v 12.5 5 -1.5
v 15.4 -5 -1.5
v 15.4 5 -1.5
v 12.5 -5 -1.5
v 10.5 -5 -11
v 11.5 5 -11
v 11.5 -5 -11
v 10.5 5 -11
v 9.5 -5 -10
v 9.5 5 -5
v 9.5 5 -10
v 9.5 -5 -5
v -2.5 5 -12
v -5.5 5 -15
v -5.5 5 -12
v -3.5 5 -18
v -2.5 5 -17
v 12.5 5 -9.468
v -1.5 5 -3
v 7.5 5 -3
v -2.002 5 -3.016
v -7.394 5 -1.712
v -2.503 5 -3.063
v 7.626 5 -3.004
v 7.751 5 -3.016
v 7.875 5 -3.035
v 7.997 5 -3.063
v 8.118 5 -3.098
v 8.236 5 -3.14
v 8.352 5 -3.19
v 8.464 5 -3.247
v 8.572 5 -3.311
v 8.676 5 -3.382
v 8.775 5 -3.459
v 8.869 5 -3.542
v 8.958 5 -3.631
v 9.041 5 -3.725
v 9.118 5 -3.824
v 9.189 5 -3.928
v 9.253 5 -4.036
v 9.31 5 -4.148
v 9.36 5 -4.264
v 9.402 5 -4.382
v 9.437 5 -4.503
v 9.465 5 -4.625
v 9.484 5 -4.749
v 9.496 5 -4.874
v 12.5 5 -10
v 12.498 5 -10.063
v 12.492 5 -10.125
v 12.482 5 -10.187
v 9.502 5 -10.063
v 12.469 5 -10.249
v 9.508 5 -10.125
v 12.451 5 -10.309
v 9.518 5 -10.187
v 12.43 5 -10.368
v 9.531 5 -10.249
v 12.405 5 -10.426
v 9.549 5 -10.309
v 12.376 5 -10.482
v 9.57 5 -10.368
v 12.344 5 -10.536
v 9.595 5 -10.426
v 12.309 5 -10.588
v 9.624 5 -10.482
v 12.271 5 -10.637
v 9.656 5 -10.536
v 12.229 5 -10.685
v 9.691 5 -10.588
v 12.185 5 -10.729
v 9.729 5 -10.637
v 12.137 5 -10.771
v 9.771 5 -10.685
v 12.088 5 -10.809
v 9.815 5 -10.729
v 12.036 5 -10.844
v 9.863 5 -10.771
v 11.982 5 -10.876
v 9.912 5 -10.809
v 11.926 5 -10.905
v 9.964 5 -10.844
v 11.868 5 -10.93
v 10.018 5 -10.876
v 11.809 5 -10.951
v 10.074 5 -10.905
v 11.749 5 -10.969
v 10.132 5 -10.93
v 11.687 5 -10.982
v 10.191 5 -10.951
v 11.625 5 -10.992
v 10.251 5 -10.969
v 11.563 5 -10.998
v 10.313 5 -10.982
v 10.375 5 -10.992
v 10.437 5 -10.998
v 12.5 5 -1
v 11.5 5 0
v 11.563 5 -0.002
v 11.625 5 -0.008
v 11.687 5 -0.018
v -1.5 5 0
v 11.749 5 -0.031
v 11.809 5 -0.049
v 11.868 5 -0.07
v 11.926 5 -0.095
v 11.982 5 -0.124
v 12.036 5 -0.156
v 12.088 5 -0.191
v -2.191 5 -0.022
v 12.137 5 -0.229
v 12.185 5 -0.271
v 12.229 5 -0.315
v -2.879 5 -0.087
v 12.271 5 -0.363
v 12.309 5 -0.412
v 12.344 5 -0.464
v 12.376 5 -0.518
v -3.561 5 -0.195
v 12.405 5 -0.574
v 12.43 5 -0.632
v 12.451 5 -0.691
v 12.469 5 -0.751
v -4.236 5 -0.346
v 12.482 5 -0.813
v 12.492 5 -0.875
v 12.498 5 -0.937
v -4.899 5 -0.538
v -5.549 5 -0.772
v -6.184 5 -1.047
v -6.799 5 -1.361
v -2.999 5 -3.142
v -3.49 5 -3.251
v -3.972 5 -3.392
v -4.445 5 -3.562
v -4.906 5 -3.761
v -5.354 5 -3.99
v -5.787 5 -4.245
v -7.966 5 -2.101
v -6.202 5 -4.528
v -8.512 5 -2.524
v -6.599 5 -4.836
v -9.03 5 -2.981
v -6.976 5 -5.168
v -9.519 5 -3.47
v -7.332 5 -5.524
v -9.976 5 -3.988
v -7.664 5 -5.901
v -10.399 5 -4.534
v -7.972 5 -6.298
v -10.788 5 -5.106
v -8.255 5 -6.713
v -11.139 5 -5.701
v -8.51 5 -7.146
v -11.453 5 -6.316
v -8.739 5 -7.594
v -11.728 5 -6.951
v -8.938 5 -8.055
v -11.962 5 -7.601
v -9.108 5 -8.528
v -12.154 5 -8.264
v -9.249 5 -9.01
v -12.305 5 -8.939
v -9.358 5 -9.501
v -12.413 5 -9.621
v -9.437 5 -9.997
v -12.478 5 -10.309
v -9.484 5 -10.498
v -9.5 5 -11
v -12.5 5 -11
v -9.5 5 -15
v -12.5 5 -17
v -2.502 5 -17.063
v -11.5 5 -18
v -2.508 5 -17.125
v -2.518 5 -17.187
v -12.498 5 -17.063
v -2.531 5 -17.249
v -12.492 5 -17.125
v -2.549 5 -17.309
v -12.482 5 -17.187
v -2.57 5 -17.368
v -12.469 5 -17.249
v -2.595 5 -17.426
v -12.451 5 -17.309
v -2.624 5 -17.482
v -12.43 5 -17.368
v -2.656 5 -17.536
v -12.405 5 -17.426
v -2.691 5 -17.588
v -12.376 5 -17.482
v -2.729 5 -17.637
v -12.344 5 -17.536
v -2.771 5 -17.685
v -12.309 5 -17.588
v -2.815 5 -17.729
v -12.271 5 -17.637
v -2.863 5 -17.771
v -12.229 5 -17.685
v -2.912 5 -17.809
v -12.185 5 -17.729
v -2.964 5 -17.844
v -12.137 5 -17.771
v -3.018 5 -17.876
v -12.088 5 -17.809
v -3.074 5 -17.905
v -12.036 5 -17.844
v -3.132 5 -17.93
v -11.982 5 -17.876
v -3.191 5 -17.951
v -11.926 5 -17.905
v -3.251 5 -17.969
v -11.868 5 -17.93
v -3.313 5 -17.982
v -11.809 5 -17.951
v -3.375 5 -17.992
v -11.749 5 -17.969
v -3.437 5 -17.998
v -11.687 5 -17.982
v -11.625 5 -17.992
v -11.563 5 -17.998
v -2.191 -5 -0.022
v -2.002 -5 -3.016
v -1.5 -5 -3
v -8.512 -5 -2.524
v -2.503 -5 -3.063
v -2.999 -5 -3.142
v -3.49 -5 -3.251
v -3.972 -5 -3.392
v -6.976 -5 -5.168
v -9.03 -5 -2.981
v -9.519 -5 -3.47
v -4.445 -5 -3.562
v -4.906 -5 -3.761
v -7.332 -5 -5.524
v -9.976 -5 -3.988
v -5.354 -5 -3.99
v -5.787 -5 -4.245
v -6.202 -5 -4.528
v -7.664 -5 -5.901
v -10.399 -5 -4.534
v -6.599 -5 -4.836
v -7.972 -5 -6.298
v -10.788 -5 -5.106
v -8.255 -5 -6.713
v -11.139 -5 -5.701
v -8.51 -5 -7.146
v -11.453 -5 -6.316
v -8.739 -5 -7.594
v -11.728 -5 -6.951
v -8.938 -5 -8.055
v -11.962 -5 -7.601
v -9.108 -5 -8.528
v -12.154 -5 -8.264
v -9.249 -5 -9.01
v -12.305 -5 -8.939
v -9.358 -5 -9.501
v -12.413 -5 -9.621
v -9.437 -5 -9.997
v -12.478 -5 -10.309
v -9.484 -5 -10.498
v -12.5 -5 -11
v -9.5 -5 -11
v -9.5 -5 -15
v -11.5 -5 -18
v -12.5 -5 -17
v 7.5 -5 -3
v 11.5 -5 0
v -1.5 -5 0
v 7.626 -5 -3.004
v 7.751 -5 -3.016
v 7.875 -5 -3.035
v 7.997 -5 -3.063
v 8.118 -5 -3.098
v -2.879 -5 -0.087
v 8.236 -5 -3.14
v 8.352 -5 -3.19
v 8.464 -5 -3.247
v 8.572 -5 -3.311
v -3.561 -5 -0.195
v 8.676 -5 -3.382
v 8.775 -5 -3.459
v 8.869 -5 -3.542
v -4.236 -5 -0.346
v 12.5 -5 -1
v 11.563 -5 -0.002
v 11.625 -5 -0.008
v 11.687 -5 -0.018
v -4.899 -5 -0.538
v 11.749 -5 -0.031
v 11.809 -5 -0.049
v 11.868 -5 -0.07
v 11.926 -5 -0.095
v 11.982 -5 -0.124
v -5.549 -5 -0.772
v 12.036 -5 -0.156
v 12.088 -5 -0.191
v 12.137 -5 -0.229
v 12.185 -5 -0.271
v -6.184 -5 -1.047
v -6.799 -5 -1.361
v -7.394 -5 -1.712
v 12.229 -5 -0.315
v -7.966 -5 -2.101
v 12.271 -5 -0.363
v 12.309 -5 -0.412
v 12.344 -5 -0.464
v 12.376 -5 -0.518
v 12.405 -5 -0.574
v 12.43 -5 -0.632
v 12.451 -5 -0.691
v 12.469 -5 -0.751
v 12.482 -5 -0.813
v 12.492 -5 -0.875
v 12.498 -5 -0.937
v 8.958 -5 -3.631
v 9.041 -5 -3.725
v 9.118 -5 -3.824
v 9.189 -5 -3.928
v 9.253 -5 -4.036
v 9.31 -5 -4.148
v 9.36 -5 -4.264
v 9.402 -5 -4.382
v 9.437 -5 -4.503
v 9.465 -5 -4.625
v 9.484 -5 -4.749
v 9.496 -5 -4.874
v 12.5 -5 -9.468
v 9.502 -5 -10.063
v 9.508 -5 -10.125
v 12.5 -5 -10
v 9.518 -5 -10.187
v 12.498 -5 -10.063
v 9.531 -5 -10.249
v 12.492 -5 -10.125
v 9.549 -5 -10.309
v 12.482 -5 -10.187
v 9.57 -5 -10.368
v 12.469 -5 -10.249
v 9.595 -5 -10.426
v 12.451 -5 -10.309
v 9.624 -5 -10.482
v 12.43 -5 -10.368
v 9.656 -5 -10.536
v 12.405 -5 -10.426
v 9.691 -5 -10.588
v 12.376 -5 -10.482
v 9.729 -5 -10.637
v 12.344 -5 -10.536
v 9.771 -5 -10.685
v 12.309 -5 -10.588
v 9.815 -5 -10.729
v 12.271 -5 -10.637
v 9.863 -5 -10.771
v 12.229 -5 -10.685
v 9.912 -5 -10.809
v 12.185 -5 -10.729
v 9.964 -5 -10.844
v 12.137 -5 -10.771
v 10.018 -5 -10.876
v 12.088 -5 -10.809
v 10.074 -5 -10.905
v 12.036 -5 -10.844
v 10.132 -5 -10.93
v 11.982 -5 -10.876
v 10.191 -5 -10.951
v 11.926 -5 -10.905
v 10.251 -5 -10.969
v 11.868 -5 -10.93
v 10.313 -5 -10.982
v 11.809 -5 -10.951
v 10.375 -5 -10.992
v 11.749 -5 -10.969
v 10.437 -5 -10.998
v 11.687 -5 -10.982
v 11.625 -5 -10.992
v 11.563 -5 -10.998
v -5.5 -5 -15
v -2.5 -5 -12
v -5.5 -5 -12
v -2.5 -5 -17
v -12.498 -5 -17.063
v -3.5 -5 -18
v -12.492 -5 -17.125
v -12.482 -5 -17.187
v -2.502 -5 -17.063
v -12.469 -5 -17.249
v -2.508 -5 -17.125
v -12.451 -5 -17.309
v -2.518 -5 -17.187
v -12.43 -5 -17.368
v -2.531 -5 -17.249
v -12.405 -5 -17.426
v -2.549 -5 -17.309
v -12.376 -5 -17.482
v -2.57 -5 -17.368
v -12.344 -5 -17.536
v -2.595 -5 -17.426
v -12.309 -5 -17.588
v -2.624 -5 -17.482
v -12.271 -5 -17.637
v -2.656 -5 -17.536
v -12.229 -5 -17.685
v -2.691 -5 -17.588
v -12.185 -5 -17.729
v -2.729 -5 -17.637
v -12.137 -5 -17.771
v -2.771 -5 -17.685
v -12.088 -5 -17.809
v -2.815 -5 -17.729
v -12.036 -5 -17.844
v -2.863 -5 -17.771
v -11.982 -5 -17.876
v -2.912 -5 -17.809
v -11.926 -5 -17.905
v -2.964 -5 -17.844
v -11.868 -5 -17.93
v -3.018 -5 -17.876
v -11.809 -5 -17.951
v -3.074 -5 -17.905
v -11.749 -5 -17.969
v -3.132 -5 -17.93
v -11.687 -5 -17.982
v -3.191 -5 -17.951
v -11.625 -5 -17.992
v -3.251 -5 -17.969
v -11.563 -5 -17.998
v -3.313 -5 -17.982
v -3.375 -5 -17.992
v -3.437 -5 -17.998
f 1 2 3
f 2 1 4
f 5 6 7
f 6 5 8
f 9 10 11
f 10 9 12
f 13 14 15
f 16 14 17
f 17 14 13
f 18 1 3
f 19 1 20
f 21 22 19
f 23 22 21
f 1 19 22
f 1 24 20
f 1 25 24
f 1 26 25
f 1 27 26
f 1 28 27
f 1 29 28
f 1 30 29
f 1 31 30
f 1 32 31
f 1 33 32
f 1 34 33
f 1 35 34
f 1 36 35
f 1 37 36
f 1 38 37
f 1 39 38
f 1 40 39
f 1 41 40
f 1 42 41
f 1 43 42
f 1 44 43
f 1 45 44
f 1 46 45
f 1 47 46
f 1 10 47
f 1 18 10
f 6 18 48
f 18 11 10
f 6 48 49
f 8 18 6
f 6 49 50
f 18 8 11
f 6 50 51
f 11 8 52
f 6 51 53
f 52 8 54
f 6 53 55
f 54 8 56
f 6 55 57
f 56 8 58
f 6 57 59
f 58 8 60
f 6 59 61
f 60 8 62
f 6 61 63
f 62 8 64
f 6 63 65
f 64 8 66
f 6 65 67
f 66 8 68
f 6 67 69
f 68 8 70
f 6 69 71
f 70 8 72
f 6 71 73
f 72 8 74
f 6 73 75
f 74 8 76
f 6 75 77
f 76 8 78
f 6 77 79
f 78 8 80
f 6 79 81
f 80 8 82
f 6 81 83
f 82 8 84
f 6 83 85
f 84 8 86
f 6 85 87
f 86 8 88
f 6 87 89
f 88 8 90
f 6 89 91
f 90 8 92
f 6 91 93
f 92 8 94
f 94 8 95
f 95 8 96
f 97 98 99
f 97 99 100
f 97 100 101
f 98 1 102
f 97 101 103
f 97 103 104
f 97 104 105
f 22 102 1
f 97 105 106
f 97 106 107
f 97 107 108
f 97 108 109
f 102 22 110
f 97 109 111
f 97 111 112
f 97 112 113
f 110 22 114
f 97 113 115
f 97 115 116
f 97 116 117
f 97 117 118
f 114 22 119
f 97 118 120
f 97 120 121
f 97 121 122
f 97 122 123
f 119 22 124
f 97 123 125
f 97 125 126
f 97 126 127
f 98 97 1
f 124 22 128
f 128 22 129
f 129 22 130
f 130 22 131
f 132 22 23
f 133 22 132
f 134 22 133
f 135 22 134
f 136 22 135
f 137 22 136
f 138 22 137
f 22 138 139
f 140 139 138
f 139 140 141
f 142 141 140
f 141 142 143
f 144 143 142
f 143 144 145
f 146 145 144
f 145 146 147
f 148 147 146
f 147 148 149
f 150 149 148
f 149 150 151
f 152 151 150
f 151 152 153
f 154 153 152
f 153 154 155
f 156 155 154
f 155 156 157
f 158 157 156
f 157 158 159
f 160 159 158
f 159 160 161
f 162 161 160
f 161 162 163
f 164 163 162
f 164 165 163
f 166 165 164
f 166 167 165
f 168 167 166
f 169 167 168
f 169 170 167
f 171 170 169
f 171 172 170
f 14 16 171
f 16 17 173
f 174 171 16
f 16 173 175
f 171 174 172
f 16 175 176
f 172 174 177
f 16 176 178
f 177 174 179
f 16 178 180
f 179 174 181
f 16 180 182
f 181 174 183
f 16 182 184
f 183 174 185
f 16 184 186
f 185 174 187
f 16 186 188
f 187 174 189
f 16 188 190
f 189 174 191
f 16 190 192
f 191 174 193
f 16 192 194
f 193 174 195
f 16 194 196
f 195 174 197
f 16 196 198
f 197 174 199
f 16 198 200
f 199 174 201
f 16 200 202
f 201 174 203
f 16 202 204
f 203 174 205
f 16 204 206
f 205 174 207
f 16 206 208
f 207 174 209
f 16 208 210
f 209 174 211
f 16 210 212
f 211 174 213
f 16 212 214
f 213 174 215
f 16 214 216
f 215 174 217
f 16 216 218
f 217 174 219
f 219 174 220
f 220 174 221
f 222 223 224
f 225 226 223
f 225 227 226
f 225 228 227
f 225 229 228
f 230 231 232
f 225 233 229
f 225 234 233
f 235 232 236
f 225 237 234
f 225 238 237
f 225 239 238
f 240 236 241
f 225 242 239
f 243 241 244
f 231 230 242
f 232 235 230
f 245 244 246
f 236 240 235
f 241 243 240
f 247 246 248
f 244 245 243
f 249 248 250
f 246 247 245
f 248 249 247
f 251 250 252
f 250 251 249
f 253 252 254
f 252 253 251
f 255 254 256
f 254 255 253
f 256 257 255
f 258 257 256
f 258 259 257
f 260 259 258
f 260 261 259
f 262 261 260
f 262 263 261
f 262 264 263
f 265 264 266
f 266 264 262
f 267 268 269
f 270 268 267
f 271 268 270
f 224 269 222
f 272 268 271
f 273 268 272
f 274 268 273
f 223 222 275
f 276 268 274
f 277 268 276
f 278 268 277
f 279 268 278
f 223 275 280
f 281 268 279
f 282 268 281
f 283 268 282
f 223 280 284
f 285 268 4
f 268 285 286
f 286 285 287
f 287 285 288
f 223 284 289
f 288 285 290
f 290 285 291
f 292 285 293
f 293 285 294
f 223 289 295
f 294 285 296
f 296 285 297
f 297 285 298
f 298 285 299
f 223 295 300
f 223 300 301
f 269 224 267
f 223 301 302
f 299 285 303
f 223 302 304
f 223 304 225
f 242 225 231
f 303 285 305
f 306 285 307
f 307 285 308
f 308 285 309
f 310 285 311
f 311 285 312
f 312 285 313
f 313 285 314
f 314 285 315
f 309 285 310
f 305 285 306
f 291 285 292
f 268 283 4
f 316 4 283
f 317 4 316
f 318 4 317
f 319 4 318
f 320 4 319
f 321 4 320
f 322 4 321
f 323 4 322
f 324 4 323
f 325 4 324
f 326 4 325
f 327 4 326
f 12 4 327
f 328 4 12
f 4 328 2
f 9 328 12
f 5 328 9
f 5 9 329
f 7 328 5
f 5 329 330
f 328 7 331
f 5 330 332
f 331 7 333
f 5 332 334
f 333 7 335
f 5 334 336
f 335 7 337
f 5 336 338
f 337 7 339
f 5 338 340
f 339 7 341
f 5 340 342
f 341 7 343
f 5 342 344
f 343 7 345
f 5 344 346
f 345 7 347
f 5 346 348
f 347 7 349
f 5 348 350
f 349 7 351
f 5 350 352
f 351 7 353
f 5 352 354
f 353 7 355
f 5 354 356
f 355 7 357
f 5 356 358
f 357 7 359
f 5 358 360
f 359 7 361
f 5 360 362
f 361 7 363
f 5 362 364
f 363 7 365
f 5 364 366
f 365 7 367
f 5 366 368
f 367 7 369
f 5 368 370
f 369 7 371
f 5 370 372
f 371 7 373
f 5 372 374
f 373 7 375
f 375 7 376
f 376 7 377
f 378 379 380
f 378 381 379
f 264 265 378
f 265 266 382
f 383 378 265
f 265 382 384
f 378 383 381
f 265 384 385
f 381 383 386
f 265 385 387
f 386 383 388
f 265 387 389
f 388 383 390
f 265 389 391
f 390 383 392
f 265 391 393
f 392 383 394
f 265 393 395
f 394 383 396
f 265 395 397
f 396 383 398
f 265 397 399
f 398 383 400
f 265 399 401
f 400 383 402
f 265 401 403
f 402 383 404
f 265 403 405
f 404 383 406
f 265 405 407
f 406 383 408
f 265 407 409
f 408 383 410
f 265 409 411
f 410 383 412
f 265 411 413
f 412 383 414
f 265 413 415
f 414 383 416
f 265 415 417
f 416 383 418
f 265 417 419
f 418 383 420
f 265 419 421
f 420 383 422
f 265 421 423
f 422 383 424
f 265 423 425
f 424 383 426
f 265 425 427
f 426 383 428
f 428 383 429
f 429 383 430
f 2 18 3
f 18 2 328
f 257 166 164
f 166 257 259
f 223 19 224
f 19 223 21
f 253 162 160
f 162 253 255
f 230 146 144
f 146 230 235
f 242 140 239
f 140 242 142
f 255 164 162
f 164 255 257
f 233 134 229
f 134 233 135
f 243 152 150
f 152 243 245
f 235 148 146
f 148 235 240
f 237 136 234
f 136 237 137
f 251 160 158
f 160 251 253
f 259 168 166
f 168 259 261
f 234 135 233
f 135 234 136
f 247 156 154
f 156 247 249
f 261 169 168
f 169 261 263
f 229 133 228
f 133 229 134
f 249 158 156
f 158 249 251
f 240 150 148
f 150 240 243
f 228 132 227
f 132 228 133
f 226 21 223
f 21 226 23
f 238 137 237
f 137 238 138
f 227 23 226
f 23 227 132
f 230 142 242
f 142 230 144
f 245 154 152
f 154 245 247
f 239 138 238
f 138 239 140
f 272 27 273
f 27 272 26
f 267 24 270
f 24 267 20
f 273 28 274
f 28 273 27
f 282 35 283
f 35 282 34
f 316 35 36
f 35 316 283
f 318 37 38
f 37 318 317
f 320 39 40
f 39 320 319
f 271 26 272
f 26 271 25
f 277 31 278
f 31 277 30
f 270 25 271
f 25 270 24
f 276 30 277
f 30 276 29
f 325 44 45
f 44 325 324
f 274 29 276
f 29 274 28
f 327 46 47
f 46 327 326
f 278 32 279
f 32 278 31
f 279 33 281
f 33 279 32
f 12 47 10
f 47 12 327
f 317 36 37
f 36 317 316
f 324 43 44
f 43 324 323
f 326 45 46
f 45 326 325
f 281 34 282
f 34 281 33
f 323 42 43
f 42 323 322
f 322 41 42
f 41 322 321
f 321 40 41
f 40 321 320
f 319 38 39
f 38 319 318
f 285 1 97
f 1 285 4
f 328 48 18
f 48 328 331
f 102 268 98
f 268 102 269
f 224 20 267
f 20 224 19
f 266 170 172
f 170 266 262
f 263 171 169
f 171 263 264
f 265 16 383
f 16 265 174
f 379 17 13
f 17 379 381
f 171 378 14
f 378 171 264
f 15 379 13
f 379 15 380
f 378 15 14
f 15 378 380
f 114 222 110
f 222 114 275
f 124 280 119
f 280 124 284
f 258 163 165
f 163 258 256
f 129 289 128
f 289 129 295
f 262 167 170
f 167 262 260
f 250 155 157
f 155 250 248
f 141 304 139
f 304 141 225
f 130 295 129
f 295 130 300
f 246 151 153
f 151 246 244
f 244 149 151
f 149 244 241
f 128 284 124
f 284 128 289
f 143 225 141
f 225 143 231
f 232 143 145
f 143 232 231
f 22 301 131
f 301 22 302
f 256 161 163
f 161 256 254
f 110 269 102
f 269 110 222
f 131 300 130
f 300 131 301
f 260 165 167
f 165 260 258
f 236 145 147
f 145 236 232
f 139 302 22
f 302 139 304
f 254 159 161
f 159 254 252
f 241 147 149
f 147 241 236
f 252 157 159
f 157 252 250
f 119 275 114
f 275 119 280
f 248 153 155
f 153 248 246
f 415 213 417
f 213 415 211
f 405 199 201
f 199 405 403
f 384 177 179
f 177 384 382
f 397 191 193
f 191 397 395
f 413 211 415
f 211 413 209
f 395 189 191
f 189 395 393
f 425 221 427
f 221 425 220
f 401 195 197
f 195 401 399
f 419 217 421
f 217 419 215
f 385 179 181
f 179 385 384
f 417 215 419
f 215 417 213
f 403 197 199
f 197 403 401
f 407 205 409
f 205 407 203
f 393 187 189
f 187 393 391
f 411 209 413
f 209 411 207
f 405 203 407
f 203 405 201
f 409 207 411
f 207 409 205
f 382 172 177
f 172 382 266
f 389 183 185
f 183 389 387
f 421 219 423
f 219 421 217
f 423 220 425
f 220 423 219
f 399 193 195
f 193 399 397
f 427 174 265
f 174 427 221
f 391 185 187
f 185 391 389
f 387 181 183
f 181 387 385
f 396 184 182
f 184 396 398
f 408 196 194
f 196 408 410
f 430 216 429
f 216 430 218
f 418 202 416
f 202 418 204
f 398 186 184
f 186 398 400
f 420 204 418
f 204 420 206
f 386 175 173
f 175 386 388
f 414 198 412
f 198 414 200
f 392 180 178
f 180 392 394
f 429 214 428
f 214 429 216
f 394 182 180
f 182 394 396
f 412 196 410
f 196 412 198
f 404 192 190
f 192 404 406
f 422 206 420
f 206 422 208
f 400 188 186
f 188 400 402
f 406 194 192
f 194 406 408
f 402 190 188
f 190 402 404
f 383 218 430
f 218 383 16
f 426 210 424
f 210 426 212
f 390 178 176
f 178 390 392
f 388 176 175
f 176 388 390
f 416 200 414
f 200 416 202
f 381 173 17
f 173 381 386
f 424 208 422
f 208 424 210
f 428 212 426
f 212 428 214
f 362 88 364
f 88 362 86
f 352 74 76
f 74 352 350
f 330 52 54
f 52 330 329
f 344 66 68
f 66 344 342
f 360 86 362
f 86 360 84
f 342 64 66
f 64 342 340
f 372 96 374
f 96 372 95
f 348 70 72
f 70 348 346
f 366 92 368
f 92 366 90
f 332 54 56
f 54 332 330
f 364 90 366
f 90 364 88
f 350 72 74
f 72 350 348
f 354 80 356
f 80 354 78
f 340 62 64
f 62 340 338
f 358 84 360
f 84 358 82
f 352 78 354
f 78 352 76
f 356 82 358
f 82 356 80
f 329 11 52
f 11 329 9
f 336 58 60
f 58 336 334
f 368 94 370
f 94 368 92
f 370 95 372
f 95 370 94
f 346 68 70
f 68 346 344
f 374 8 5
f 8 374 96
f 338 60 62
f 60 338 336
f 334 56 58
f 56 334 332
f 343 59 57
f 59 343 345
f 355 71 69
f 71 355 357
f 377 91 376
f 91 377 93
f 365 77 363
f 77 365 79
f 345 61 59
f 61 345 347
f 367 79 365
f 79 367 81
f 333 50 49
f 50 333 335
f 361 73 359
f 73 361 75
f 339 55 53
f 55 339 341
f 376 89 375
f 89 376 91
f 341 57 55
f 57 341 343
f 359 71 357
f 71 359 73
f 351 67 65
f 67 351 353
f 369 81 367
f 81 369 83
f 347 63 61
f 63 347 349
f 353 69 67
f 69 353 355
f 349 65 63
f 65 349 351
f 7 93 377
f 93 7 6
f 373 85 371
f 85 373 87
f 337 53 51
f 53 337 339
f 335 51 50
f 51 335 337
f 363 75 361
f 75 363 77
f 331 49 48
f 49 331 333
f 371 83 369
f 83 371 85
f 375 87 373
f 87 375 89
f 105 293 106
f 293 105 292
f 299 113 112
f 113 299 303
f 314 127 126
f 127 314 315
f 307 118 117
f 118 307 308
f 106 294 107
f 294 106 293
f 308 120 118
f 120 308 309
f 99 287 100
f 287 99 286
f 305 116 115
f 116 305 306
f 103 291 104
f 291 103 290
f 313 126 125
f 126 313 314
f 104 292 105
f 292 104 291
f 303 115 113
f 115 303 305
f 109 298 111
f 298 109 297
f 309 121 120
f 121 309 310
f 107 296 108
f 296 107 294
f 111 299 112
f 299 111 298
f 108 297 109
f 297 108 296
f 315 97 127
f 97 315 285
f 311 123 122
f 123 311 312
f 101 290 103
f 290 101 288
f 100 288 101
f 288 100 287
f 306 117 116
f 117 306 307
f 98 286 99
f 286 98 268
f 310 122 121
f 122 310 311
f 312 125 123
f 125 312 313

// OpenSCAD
/*
 * Variables for Thingiverse Customizer
 * ==================================================================
 *
 */

// The width of the clips in mm (I use 10 mm and have 4 clips per box)
Clips_Width = 10;


/*
 * Library function: edge
 * ==================================================================
 *
 * Used to make roundes edges on objects
 *
 */
module edge(radius, height)
{
	difference()
	{
		translate([radius/2-0.5, radius/2-0.5, 0])
			cube([radius+1, radius+1, height], center = true);

		translate([radius, radius, 0])
			cylinder(h = height+1, r1 = radius, r2 = radius, center = true, $fn = 100);
	}
}

module ikea_samla_clips(width)
{
	length = 25;
	difference()
	{
		union()
		{
			
			translate([0, 0, -3/2])
				cube(size=[length, width, 3], center=true);
		
			translate([length/2-3/2, 0, -(8+3)/2])
				cube(size=[3, width, 8+3], center=true);
		
			difference()
			{
				translate([length/2, 0, -(8+3+1.5)/2])
					cube(size=[6, width, 8+3-1.5], center=true);
			
				translate([length/2+3+1, 0, -(8+3+1.5)/2-1])
				rotate(20, [0, 1, 0])
					cube(size=[6, width+1, 8+3], center=true);
			}
			
			translate([-length/2+3, 0, -3])
			rotate(-90, [1, 0, 0])
				edge(8, width);
		
			translate([-(length/2-3/2), 0, -(12+3+3)/2])
				cube(size=[3, width, 12+3+3], center=true);
		
			translate([-(length/2-(3+4+3)/2), 0, -12-3-3/2])
				cube(size=[3+4+3, width, 3], center=true);
		
			translate([-(length/2-(3+4+3)+(3/2)), 0, -12-3])
				cube(size=[3, width, 3+3], center=true);
				
			translate([length/2-3, 0, -3])
			rotate(-90, [1, 0, 0])
			rotate(90, [0, 0, 1])
				edge(2, width);				
		}
		
		union()
		{
			translate([-length/2, 0, 0])
			rotate(-90, [1, 0, 0])
				edge(8+3, width+1);
				
			translate([-length/2, 0, -12-3-3])
			rotate(-90, [1, 0, 0])
			rotate(-90, [0, 0, 1])
				edge(1, width+1);
			
			translate([-length/2+3+4+3, 0, -12-3-3])
			rotate(-90, [1, 0, 0])
			rotate(-180, [0, 0, 1])
				edge(1, width+1);

			translate([length/2-3, 0, -8-3])
			rotate(-90, [1, 0, 0])
			rotate(-90, [0, 0, 1])
				edge(1, width+1);
		
			translate([length/2, 0, -8-3])
			rotate(-90, [1, 0, 0])
			rotate(-180, [0, 0, 1])
				edge(1, width+1);
		
			translate([length/2, 0, 0])
			rotate(-90, [1, 0, 0])
			rotate(90, [0, 0, 1])
				edge(1, width+1);
				}	
	}
}

ikea_samla_clips(Clips_Width);
